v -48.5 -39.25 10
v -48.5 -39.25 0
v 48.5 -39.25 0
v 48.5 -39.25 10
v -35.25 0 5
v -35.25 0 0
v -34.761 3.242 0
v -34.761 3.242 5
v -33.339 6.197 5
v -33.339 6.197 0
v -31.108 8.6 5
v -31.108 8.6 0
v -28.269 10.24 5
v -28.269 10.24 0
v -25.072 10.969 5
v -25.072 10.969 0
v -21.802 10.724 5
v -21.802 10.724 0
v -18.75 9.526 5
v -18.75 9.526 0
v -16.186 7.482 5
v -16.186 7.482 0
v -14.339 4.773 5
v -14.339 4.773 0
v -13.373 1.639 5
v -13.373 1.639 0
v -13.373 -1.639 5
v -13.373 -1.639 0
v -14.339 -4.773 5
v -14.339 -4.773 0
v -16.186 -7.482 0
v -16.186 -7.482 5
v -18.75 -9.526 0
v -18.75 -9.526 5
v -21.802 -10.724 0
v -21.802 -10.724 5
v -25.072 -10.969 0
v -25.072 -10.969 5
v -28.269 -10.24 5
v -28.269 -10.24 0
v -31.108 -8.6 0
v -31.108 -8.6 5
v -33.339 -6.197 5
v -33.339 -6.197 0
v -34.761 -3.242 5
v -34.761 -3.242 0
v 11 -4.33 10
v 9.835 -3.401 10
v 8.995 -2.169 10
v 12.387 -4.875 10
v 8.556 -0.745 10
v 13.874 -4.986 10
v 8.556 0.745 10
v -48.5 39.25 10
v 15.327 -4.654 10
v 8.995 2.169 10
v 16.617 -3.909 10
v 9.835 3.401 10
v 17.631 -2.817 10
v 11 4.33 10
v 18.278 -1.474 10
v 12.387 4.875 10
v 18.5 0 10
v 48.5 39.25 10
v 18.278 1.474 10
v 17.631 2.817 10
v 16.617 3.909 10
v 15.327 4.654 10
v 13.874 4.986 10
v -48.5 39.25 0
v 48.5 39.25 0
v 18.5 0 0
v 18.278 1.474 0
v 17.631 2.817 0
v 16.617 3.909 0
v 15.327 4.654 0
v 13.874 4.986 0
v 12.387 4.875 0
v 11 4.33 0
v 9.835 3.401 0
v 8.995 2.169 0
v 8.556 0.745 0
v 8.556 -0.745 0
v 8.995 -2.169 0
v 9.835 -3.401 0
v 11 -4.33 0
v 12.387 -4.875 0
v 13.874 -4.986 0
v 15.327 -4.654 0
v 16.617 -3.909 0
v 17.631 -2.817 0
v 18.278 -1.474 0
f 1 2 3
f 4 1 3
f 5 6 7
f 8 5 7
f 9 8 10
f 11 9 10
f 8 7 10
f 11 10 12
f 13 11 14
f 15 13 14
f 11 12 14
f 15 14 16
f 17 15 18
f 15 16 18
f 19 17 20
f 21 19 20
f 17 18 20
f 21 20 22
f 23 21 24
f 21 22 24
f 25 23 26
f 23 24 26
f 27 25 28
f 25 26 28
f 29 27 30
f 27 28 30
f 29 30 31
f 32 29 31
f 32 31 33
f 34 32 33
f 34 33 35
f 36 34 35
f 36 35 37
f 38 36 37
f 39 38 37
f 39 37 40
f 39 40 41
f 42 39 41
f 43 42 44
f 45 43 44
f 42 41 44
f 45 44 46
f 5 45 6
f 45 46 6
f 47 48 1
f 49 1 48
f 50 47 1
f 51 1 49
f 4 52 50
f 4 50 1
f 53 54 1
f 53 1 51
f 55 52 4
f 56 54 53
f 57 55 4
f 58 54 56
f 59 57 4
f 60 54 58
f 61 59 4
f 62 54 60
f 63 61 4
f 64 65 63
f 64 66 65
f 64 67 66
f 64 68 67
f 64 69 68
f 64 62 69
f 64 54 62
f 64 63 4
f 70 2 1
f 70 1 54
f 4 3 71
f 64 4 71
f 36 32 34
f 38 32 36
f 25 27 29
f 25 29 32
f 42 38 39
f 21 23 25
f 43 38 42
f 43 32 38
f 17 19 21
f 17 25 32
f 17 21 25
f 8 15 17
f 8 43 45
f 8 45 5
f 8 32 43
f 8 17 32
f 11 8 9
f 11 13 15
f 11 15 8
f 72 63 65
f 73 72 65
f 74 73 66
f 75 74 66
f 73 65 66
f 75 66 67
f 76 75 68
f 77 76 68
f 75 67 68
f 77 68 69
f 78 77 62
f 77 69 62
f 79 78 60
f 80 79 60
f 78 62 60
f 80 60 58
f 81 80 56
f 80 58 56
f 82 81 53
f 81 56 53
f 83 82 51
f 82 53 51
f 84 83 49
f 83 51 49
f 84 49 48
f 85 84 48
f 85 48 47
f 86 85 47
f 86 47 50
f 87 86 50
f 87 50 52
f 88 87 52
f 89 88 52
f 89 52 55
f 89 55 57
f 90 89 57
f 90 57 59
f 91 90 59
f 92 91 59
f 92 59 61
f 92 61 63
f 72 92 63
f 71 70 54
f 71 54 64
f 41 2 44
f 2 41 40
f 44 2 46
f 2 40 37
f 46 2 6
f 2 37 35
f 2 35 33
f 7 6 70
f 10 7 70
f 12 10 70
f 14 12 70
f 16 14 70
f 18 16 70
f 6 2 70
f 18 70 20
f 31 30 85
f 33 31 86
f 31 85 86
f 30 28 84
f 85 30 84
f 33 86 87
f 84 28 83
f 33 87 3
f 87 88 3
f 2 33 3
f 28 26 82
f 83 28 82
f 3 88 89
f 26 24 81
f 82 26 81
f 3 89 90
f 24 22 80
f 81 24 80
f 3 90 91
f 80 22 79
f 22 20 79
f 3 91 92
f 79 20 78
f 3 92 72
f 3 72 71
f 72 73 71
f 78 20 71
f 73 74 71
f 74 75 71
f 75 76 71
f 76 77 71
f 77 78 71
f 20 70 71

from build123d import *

# Parameters (mm, degrees)
SKETCH1_W           = 97
SKETCH1_H           = 78.5
BOSS_EXTRUDE1_DEPTH = 10
CUT_EXTRUDE1_REACH  = 65.189
SKETCH2_R           = 5
SKETCH3_R           = 11
CUT_EXTRUDE2_DEPTH  = 5


with BuildPart() as part:
    # Sketch1 → Boss-Extrude1 (new body)
    with BuildSketch(Plane.XY):
        Rectangle(SKETCH1_W, SKETCH1_H)
    extrude(amount=BOSS_EXTRUDE1_DEPTH)

    # Sketch2 → Cut-Extrude1 (cut, up to next)
    with BuildSketch(Plane.XY.offset(10), mode=Mode.PRIVATE) as cut_extrude1_sk1:
        with Locations((13.5, 0)):
            Circle(SKETCH2_R)
    cut_extrude1_tool1 = extrude(cut_extrude1_sk1.sketch, amount=-CUT_EXTRUDE1_REACH, mode=Mode.PRIVATE) & part.part
    add(cut_extrude1_tool1.solids().sort_by_distance((13.5, 0, 10))[0], mode=Mode.SUBTRACT)

    # Sketch3 → Cut-Extrude2 (cut)
    with BuildSketch(Plane(origin=(0, 0, 0), x_dir=(-1, 0, 0), z_dir=(0, 0, -1))):
        with Locations((24.25, 0)):
            Circle(SKETCH3_R)
    extrude(amount=-CUT_EXTRUDE2_DEPTH, mode=Mode.SUBTRACT)


solid = part.part
